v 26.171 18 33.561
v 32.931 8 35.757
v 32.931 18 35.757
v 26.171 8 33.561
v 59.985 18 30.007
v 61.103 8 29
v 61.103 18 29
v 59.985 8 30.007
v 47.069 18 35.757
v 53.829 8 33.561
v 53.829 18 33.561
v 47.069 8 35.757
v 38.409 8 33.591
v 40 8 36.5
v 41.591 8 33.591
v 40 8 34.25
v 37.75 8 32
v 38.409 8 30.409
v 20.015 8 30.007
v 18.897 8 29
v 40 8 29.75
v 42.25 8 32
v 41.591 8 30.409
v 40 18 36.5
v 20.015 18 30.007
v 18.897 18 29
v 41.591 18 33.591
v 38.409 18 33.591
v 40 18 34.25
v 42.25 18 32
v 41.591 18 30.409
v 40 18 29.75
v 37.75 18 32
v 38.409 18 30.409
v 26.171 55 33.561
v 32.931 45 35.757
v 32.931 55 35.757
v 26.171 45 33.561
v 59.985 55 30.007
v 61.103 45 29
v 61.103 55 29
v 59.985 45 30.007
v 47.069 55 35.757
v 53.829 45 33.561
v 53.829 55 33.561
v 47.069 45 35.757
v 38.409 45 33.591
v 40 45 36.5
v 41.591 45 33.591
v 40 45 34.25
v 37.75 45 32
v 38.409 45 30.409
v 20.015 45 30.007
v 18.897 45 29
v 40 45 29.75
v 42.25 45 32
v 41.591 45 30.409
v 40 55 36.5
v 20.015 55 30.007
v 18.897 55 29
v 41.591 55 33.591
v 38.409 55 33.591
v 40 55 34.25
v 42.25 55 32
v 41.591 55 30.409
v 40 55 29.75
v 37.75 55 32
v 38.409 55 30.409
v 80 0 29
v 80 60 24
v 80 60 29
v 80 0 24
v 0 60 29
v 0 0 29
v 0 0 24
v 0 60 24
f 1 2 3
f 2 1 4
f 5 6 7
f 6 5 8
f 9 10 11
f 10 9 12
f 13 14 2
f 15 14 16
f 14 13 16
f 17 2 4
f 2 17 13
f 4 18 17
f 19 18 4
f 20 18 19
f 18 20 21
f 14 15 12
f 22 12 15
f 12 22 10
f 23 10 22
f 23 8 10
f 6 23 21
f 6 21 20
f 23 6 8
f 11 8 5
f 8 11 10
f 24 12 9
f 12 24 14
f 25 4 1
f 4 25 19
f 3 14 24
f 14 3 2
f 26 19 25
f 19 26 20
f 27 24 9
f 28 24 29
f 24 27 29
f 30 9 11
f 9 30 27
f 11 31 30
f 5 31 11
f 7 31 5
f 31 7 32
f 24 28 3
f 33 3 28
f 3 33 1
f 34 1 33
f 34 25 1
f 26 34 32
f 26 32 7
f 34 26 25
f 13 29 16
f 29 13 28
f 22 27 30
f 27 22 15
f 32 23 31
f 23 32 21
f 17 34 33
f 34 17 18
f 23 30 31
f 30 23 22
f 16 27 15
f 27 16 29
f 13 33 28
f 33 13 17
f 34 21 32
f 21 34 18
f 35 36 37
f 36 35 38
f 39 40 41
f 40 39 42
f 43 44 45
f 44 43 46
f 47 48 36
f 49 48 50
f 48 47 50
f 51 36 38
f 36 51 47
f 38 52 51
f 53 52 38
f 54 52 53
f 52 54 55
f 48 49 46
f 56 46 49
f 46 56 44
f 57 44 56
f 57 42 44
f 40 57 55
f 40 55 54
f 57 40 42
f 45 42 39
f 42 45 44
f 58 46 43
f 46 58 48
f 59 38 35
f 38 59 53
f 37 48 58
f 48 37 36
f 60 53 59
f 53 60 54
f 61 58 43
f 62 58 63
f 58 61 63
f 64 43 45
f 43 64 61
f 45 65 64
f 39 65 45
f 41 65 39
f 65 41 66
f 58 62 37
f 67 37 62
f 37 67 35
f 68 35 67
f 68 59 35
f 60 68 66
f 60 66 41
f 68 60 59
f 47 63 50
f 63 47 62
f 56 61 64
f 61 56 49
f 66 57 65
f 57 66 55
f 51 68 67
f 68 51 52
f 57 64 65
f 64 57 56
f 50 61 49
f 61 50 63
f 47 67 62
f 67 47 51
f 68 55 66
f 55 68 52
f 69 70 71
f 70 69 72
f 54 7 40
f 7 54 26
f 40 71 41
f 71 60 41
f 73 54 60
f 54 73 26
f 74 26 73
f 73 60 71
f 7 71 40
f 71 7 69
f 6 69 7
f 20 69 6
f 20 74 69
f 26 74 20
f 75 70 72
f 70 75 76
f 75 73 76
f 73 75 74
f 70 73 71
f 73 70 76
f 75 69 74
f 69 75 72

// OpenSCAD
// prototype pedal 
plate_width = 80;
plate_length = 60;
plate_height = 5;

platehole_width = 60;
platehole_length = 20;
platehole_height = 17;

plate_dimensions = [plate_width,plate_length,plate_height];
hole_dimensions = [platehole_width, platehole_length, platehole_height];

drillhole_gap = 10;
drillhole_diameter = 4.5;
drillhole_spring_diameter = 6.5;
edge_gap = drillhole_gap + drillhole_diameter / 2; 

drillholedistance_x = plate_dimensions.x - 2*drillhole_gap;
drillholedistance_y = plate_dimensions.y - 2*drillhole_gap;
drillhole_x = [drillhole_gap : drillholedistance_x : plate_dimensions.x - drillhole_gap];
drillhole_y = [drillhole_gap : drillholedistance_y : plate_dimensions.y - drillhole_gap];

angle_placement = ((plate_length/2)-(platehole_length/2))/2;


//https://www.reddit.com/r/openscad/comments/loask5/half_sphere_cropping_how_do_i_cut_things/
module halfcylinder(he,rd) {
difference(){
cylinder (h=he,r=rd);

translate ([-26,-rd-0.1,-0.1]) 
cube([rd+26, rd*2+0.2, he+0.2]);
} // df
} // mod
cylinder_radius = 34;
cylinder_height = 10;

difference(){
translate([plate_width/2, angle_placement+8, (plate_height/2)])
rotate([90,90,0])
	//color("white")
halfcylinder(cylinder_height,cylinder_radius);

translate([plate_width/2,angle_placement+10,cylinder_radius-2])
    rotate([90,90,0])
	//color("blue")
    cylinder(d = drillhole_diameter, h=cylinder_height + 8);
}

difference(){
	translate([plate_width/2, plate_length-angle_placement+5,(plate_height/2)])
	rotate([90,90,0])
	//color("green")
	halfcylinder(cylinder_height,cylinder_radius);
	
	translate([plate_width/2, plate_length-angle_placement+10,cylinder_radius-2])
    rotate([90,90,0])
    cylinder(d = drillhole_diameter, h=cylinder_height + 8);
}

//hier ziehen wir sachen von anderen sachen ab
difference(){
   
	translate([0,0,24])
	cube(plate_dimensions);
   
	for(x = drillhole_x, y = drillhole_y)
	translate([x,y, -1])
	cylinder(d = drillhole_diameter, h = plate_dimensions.z +2);
   
    translate([
        (plate_width - platehole_width)/2,
		(plate_length - platehole_length)/2,
		-1])
   
    cube(hole_dimensions);  
   
   translate([(plate_width-platehole_width)/4,plate_length/2, -1])
   
   //color("black")
    cylinder(d = drillhole_spring_diameter, h=cylinder_height + 8);
   
   translate([plate_width-((plate_width-platehole_width)/4),plate_length/2, -1])
    cylinder(d = drillhole_spring_diameter, h=cylinder_height + 8);
   
}
